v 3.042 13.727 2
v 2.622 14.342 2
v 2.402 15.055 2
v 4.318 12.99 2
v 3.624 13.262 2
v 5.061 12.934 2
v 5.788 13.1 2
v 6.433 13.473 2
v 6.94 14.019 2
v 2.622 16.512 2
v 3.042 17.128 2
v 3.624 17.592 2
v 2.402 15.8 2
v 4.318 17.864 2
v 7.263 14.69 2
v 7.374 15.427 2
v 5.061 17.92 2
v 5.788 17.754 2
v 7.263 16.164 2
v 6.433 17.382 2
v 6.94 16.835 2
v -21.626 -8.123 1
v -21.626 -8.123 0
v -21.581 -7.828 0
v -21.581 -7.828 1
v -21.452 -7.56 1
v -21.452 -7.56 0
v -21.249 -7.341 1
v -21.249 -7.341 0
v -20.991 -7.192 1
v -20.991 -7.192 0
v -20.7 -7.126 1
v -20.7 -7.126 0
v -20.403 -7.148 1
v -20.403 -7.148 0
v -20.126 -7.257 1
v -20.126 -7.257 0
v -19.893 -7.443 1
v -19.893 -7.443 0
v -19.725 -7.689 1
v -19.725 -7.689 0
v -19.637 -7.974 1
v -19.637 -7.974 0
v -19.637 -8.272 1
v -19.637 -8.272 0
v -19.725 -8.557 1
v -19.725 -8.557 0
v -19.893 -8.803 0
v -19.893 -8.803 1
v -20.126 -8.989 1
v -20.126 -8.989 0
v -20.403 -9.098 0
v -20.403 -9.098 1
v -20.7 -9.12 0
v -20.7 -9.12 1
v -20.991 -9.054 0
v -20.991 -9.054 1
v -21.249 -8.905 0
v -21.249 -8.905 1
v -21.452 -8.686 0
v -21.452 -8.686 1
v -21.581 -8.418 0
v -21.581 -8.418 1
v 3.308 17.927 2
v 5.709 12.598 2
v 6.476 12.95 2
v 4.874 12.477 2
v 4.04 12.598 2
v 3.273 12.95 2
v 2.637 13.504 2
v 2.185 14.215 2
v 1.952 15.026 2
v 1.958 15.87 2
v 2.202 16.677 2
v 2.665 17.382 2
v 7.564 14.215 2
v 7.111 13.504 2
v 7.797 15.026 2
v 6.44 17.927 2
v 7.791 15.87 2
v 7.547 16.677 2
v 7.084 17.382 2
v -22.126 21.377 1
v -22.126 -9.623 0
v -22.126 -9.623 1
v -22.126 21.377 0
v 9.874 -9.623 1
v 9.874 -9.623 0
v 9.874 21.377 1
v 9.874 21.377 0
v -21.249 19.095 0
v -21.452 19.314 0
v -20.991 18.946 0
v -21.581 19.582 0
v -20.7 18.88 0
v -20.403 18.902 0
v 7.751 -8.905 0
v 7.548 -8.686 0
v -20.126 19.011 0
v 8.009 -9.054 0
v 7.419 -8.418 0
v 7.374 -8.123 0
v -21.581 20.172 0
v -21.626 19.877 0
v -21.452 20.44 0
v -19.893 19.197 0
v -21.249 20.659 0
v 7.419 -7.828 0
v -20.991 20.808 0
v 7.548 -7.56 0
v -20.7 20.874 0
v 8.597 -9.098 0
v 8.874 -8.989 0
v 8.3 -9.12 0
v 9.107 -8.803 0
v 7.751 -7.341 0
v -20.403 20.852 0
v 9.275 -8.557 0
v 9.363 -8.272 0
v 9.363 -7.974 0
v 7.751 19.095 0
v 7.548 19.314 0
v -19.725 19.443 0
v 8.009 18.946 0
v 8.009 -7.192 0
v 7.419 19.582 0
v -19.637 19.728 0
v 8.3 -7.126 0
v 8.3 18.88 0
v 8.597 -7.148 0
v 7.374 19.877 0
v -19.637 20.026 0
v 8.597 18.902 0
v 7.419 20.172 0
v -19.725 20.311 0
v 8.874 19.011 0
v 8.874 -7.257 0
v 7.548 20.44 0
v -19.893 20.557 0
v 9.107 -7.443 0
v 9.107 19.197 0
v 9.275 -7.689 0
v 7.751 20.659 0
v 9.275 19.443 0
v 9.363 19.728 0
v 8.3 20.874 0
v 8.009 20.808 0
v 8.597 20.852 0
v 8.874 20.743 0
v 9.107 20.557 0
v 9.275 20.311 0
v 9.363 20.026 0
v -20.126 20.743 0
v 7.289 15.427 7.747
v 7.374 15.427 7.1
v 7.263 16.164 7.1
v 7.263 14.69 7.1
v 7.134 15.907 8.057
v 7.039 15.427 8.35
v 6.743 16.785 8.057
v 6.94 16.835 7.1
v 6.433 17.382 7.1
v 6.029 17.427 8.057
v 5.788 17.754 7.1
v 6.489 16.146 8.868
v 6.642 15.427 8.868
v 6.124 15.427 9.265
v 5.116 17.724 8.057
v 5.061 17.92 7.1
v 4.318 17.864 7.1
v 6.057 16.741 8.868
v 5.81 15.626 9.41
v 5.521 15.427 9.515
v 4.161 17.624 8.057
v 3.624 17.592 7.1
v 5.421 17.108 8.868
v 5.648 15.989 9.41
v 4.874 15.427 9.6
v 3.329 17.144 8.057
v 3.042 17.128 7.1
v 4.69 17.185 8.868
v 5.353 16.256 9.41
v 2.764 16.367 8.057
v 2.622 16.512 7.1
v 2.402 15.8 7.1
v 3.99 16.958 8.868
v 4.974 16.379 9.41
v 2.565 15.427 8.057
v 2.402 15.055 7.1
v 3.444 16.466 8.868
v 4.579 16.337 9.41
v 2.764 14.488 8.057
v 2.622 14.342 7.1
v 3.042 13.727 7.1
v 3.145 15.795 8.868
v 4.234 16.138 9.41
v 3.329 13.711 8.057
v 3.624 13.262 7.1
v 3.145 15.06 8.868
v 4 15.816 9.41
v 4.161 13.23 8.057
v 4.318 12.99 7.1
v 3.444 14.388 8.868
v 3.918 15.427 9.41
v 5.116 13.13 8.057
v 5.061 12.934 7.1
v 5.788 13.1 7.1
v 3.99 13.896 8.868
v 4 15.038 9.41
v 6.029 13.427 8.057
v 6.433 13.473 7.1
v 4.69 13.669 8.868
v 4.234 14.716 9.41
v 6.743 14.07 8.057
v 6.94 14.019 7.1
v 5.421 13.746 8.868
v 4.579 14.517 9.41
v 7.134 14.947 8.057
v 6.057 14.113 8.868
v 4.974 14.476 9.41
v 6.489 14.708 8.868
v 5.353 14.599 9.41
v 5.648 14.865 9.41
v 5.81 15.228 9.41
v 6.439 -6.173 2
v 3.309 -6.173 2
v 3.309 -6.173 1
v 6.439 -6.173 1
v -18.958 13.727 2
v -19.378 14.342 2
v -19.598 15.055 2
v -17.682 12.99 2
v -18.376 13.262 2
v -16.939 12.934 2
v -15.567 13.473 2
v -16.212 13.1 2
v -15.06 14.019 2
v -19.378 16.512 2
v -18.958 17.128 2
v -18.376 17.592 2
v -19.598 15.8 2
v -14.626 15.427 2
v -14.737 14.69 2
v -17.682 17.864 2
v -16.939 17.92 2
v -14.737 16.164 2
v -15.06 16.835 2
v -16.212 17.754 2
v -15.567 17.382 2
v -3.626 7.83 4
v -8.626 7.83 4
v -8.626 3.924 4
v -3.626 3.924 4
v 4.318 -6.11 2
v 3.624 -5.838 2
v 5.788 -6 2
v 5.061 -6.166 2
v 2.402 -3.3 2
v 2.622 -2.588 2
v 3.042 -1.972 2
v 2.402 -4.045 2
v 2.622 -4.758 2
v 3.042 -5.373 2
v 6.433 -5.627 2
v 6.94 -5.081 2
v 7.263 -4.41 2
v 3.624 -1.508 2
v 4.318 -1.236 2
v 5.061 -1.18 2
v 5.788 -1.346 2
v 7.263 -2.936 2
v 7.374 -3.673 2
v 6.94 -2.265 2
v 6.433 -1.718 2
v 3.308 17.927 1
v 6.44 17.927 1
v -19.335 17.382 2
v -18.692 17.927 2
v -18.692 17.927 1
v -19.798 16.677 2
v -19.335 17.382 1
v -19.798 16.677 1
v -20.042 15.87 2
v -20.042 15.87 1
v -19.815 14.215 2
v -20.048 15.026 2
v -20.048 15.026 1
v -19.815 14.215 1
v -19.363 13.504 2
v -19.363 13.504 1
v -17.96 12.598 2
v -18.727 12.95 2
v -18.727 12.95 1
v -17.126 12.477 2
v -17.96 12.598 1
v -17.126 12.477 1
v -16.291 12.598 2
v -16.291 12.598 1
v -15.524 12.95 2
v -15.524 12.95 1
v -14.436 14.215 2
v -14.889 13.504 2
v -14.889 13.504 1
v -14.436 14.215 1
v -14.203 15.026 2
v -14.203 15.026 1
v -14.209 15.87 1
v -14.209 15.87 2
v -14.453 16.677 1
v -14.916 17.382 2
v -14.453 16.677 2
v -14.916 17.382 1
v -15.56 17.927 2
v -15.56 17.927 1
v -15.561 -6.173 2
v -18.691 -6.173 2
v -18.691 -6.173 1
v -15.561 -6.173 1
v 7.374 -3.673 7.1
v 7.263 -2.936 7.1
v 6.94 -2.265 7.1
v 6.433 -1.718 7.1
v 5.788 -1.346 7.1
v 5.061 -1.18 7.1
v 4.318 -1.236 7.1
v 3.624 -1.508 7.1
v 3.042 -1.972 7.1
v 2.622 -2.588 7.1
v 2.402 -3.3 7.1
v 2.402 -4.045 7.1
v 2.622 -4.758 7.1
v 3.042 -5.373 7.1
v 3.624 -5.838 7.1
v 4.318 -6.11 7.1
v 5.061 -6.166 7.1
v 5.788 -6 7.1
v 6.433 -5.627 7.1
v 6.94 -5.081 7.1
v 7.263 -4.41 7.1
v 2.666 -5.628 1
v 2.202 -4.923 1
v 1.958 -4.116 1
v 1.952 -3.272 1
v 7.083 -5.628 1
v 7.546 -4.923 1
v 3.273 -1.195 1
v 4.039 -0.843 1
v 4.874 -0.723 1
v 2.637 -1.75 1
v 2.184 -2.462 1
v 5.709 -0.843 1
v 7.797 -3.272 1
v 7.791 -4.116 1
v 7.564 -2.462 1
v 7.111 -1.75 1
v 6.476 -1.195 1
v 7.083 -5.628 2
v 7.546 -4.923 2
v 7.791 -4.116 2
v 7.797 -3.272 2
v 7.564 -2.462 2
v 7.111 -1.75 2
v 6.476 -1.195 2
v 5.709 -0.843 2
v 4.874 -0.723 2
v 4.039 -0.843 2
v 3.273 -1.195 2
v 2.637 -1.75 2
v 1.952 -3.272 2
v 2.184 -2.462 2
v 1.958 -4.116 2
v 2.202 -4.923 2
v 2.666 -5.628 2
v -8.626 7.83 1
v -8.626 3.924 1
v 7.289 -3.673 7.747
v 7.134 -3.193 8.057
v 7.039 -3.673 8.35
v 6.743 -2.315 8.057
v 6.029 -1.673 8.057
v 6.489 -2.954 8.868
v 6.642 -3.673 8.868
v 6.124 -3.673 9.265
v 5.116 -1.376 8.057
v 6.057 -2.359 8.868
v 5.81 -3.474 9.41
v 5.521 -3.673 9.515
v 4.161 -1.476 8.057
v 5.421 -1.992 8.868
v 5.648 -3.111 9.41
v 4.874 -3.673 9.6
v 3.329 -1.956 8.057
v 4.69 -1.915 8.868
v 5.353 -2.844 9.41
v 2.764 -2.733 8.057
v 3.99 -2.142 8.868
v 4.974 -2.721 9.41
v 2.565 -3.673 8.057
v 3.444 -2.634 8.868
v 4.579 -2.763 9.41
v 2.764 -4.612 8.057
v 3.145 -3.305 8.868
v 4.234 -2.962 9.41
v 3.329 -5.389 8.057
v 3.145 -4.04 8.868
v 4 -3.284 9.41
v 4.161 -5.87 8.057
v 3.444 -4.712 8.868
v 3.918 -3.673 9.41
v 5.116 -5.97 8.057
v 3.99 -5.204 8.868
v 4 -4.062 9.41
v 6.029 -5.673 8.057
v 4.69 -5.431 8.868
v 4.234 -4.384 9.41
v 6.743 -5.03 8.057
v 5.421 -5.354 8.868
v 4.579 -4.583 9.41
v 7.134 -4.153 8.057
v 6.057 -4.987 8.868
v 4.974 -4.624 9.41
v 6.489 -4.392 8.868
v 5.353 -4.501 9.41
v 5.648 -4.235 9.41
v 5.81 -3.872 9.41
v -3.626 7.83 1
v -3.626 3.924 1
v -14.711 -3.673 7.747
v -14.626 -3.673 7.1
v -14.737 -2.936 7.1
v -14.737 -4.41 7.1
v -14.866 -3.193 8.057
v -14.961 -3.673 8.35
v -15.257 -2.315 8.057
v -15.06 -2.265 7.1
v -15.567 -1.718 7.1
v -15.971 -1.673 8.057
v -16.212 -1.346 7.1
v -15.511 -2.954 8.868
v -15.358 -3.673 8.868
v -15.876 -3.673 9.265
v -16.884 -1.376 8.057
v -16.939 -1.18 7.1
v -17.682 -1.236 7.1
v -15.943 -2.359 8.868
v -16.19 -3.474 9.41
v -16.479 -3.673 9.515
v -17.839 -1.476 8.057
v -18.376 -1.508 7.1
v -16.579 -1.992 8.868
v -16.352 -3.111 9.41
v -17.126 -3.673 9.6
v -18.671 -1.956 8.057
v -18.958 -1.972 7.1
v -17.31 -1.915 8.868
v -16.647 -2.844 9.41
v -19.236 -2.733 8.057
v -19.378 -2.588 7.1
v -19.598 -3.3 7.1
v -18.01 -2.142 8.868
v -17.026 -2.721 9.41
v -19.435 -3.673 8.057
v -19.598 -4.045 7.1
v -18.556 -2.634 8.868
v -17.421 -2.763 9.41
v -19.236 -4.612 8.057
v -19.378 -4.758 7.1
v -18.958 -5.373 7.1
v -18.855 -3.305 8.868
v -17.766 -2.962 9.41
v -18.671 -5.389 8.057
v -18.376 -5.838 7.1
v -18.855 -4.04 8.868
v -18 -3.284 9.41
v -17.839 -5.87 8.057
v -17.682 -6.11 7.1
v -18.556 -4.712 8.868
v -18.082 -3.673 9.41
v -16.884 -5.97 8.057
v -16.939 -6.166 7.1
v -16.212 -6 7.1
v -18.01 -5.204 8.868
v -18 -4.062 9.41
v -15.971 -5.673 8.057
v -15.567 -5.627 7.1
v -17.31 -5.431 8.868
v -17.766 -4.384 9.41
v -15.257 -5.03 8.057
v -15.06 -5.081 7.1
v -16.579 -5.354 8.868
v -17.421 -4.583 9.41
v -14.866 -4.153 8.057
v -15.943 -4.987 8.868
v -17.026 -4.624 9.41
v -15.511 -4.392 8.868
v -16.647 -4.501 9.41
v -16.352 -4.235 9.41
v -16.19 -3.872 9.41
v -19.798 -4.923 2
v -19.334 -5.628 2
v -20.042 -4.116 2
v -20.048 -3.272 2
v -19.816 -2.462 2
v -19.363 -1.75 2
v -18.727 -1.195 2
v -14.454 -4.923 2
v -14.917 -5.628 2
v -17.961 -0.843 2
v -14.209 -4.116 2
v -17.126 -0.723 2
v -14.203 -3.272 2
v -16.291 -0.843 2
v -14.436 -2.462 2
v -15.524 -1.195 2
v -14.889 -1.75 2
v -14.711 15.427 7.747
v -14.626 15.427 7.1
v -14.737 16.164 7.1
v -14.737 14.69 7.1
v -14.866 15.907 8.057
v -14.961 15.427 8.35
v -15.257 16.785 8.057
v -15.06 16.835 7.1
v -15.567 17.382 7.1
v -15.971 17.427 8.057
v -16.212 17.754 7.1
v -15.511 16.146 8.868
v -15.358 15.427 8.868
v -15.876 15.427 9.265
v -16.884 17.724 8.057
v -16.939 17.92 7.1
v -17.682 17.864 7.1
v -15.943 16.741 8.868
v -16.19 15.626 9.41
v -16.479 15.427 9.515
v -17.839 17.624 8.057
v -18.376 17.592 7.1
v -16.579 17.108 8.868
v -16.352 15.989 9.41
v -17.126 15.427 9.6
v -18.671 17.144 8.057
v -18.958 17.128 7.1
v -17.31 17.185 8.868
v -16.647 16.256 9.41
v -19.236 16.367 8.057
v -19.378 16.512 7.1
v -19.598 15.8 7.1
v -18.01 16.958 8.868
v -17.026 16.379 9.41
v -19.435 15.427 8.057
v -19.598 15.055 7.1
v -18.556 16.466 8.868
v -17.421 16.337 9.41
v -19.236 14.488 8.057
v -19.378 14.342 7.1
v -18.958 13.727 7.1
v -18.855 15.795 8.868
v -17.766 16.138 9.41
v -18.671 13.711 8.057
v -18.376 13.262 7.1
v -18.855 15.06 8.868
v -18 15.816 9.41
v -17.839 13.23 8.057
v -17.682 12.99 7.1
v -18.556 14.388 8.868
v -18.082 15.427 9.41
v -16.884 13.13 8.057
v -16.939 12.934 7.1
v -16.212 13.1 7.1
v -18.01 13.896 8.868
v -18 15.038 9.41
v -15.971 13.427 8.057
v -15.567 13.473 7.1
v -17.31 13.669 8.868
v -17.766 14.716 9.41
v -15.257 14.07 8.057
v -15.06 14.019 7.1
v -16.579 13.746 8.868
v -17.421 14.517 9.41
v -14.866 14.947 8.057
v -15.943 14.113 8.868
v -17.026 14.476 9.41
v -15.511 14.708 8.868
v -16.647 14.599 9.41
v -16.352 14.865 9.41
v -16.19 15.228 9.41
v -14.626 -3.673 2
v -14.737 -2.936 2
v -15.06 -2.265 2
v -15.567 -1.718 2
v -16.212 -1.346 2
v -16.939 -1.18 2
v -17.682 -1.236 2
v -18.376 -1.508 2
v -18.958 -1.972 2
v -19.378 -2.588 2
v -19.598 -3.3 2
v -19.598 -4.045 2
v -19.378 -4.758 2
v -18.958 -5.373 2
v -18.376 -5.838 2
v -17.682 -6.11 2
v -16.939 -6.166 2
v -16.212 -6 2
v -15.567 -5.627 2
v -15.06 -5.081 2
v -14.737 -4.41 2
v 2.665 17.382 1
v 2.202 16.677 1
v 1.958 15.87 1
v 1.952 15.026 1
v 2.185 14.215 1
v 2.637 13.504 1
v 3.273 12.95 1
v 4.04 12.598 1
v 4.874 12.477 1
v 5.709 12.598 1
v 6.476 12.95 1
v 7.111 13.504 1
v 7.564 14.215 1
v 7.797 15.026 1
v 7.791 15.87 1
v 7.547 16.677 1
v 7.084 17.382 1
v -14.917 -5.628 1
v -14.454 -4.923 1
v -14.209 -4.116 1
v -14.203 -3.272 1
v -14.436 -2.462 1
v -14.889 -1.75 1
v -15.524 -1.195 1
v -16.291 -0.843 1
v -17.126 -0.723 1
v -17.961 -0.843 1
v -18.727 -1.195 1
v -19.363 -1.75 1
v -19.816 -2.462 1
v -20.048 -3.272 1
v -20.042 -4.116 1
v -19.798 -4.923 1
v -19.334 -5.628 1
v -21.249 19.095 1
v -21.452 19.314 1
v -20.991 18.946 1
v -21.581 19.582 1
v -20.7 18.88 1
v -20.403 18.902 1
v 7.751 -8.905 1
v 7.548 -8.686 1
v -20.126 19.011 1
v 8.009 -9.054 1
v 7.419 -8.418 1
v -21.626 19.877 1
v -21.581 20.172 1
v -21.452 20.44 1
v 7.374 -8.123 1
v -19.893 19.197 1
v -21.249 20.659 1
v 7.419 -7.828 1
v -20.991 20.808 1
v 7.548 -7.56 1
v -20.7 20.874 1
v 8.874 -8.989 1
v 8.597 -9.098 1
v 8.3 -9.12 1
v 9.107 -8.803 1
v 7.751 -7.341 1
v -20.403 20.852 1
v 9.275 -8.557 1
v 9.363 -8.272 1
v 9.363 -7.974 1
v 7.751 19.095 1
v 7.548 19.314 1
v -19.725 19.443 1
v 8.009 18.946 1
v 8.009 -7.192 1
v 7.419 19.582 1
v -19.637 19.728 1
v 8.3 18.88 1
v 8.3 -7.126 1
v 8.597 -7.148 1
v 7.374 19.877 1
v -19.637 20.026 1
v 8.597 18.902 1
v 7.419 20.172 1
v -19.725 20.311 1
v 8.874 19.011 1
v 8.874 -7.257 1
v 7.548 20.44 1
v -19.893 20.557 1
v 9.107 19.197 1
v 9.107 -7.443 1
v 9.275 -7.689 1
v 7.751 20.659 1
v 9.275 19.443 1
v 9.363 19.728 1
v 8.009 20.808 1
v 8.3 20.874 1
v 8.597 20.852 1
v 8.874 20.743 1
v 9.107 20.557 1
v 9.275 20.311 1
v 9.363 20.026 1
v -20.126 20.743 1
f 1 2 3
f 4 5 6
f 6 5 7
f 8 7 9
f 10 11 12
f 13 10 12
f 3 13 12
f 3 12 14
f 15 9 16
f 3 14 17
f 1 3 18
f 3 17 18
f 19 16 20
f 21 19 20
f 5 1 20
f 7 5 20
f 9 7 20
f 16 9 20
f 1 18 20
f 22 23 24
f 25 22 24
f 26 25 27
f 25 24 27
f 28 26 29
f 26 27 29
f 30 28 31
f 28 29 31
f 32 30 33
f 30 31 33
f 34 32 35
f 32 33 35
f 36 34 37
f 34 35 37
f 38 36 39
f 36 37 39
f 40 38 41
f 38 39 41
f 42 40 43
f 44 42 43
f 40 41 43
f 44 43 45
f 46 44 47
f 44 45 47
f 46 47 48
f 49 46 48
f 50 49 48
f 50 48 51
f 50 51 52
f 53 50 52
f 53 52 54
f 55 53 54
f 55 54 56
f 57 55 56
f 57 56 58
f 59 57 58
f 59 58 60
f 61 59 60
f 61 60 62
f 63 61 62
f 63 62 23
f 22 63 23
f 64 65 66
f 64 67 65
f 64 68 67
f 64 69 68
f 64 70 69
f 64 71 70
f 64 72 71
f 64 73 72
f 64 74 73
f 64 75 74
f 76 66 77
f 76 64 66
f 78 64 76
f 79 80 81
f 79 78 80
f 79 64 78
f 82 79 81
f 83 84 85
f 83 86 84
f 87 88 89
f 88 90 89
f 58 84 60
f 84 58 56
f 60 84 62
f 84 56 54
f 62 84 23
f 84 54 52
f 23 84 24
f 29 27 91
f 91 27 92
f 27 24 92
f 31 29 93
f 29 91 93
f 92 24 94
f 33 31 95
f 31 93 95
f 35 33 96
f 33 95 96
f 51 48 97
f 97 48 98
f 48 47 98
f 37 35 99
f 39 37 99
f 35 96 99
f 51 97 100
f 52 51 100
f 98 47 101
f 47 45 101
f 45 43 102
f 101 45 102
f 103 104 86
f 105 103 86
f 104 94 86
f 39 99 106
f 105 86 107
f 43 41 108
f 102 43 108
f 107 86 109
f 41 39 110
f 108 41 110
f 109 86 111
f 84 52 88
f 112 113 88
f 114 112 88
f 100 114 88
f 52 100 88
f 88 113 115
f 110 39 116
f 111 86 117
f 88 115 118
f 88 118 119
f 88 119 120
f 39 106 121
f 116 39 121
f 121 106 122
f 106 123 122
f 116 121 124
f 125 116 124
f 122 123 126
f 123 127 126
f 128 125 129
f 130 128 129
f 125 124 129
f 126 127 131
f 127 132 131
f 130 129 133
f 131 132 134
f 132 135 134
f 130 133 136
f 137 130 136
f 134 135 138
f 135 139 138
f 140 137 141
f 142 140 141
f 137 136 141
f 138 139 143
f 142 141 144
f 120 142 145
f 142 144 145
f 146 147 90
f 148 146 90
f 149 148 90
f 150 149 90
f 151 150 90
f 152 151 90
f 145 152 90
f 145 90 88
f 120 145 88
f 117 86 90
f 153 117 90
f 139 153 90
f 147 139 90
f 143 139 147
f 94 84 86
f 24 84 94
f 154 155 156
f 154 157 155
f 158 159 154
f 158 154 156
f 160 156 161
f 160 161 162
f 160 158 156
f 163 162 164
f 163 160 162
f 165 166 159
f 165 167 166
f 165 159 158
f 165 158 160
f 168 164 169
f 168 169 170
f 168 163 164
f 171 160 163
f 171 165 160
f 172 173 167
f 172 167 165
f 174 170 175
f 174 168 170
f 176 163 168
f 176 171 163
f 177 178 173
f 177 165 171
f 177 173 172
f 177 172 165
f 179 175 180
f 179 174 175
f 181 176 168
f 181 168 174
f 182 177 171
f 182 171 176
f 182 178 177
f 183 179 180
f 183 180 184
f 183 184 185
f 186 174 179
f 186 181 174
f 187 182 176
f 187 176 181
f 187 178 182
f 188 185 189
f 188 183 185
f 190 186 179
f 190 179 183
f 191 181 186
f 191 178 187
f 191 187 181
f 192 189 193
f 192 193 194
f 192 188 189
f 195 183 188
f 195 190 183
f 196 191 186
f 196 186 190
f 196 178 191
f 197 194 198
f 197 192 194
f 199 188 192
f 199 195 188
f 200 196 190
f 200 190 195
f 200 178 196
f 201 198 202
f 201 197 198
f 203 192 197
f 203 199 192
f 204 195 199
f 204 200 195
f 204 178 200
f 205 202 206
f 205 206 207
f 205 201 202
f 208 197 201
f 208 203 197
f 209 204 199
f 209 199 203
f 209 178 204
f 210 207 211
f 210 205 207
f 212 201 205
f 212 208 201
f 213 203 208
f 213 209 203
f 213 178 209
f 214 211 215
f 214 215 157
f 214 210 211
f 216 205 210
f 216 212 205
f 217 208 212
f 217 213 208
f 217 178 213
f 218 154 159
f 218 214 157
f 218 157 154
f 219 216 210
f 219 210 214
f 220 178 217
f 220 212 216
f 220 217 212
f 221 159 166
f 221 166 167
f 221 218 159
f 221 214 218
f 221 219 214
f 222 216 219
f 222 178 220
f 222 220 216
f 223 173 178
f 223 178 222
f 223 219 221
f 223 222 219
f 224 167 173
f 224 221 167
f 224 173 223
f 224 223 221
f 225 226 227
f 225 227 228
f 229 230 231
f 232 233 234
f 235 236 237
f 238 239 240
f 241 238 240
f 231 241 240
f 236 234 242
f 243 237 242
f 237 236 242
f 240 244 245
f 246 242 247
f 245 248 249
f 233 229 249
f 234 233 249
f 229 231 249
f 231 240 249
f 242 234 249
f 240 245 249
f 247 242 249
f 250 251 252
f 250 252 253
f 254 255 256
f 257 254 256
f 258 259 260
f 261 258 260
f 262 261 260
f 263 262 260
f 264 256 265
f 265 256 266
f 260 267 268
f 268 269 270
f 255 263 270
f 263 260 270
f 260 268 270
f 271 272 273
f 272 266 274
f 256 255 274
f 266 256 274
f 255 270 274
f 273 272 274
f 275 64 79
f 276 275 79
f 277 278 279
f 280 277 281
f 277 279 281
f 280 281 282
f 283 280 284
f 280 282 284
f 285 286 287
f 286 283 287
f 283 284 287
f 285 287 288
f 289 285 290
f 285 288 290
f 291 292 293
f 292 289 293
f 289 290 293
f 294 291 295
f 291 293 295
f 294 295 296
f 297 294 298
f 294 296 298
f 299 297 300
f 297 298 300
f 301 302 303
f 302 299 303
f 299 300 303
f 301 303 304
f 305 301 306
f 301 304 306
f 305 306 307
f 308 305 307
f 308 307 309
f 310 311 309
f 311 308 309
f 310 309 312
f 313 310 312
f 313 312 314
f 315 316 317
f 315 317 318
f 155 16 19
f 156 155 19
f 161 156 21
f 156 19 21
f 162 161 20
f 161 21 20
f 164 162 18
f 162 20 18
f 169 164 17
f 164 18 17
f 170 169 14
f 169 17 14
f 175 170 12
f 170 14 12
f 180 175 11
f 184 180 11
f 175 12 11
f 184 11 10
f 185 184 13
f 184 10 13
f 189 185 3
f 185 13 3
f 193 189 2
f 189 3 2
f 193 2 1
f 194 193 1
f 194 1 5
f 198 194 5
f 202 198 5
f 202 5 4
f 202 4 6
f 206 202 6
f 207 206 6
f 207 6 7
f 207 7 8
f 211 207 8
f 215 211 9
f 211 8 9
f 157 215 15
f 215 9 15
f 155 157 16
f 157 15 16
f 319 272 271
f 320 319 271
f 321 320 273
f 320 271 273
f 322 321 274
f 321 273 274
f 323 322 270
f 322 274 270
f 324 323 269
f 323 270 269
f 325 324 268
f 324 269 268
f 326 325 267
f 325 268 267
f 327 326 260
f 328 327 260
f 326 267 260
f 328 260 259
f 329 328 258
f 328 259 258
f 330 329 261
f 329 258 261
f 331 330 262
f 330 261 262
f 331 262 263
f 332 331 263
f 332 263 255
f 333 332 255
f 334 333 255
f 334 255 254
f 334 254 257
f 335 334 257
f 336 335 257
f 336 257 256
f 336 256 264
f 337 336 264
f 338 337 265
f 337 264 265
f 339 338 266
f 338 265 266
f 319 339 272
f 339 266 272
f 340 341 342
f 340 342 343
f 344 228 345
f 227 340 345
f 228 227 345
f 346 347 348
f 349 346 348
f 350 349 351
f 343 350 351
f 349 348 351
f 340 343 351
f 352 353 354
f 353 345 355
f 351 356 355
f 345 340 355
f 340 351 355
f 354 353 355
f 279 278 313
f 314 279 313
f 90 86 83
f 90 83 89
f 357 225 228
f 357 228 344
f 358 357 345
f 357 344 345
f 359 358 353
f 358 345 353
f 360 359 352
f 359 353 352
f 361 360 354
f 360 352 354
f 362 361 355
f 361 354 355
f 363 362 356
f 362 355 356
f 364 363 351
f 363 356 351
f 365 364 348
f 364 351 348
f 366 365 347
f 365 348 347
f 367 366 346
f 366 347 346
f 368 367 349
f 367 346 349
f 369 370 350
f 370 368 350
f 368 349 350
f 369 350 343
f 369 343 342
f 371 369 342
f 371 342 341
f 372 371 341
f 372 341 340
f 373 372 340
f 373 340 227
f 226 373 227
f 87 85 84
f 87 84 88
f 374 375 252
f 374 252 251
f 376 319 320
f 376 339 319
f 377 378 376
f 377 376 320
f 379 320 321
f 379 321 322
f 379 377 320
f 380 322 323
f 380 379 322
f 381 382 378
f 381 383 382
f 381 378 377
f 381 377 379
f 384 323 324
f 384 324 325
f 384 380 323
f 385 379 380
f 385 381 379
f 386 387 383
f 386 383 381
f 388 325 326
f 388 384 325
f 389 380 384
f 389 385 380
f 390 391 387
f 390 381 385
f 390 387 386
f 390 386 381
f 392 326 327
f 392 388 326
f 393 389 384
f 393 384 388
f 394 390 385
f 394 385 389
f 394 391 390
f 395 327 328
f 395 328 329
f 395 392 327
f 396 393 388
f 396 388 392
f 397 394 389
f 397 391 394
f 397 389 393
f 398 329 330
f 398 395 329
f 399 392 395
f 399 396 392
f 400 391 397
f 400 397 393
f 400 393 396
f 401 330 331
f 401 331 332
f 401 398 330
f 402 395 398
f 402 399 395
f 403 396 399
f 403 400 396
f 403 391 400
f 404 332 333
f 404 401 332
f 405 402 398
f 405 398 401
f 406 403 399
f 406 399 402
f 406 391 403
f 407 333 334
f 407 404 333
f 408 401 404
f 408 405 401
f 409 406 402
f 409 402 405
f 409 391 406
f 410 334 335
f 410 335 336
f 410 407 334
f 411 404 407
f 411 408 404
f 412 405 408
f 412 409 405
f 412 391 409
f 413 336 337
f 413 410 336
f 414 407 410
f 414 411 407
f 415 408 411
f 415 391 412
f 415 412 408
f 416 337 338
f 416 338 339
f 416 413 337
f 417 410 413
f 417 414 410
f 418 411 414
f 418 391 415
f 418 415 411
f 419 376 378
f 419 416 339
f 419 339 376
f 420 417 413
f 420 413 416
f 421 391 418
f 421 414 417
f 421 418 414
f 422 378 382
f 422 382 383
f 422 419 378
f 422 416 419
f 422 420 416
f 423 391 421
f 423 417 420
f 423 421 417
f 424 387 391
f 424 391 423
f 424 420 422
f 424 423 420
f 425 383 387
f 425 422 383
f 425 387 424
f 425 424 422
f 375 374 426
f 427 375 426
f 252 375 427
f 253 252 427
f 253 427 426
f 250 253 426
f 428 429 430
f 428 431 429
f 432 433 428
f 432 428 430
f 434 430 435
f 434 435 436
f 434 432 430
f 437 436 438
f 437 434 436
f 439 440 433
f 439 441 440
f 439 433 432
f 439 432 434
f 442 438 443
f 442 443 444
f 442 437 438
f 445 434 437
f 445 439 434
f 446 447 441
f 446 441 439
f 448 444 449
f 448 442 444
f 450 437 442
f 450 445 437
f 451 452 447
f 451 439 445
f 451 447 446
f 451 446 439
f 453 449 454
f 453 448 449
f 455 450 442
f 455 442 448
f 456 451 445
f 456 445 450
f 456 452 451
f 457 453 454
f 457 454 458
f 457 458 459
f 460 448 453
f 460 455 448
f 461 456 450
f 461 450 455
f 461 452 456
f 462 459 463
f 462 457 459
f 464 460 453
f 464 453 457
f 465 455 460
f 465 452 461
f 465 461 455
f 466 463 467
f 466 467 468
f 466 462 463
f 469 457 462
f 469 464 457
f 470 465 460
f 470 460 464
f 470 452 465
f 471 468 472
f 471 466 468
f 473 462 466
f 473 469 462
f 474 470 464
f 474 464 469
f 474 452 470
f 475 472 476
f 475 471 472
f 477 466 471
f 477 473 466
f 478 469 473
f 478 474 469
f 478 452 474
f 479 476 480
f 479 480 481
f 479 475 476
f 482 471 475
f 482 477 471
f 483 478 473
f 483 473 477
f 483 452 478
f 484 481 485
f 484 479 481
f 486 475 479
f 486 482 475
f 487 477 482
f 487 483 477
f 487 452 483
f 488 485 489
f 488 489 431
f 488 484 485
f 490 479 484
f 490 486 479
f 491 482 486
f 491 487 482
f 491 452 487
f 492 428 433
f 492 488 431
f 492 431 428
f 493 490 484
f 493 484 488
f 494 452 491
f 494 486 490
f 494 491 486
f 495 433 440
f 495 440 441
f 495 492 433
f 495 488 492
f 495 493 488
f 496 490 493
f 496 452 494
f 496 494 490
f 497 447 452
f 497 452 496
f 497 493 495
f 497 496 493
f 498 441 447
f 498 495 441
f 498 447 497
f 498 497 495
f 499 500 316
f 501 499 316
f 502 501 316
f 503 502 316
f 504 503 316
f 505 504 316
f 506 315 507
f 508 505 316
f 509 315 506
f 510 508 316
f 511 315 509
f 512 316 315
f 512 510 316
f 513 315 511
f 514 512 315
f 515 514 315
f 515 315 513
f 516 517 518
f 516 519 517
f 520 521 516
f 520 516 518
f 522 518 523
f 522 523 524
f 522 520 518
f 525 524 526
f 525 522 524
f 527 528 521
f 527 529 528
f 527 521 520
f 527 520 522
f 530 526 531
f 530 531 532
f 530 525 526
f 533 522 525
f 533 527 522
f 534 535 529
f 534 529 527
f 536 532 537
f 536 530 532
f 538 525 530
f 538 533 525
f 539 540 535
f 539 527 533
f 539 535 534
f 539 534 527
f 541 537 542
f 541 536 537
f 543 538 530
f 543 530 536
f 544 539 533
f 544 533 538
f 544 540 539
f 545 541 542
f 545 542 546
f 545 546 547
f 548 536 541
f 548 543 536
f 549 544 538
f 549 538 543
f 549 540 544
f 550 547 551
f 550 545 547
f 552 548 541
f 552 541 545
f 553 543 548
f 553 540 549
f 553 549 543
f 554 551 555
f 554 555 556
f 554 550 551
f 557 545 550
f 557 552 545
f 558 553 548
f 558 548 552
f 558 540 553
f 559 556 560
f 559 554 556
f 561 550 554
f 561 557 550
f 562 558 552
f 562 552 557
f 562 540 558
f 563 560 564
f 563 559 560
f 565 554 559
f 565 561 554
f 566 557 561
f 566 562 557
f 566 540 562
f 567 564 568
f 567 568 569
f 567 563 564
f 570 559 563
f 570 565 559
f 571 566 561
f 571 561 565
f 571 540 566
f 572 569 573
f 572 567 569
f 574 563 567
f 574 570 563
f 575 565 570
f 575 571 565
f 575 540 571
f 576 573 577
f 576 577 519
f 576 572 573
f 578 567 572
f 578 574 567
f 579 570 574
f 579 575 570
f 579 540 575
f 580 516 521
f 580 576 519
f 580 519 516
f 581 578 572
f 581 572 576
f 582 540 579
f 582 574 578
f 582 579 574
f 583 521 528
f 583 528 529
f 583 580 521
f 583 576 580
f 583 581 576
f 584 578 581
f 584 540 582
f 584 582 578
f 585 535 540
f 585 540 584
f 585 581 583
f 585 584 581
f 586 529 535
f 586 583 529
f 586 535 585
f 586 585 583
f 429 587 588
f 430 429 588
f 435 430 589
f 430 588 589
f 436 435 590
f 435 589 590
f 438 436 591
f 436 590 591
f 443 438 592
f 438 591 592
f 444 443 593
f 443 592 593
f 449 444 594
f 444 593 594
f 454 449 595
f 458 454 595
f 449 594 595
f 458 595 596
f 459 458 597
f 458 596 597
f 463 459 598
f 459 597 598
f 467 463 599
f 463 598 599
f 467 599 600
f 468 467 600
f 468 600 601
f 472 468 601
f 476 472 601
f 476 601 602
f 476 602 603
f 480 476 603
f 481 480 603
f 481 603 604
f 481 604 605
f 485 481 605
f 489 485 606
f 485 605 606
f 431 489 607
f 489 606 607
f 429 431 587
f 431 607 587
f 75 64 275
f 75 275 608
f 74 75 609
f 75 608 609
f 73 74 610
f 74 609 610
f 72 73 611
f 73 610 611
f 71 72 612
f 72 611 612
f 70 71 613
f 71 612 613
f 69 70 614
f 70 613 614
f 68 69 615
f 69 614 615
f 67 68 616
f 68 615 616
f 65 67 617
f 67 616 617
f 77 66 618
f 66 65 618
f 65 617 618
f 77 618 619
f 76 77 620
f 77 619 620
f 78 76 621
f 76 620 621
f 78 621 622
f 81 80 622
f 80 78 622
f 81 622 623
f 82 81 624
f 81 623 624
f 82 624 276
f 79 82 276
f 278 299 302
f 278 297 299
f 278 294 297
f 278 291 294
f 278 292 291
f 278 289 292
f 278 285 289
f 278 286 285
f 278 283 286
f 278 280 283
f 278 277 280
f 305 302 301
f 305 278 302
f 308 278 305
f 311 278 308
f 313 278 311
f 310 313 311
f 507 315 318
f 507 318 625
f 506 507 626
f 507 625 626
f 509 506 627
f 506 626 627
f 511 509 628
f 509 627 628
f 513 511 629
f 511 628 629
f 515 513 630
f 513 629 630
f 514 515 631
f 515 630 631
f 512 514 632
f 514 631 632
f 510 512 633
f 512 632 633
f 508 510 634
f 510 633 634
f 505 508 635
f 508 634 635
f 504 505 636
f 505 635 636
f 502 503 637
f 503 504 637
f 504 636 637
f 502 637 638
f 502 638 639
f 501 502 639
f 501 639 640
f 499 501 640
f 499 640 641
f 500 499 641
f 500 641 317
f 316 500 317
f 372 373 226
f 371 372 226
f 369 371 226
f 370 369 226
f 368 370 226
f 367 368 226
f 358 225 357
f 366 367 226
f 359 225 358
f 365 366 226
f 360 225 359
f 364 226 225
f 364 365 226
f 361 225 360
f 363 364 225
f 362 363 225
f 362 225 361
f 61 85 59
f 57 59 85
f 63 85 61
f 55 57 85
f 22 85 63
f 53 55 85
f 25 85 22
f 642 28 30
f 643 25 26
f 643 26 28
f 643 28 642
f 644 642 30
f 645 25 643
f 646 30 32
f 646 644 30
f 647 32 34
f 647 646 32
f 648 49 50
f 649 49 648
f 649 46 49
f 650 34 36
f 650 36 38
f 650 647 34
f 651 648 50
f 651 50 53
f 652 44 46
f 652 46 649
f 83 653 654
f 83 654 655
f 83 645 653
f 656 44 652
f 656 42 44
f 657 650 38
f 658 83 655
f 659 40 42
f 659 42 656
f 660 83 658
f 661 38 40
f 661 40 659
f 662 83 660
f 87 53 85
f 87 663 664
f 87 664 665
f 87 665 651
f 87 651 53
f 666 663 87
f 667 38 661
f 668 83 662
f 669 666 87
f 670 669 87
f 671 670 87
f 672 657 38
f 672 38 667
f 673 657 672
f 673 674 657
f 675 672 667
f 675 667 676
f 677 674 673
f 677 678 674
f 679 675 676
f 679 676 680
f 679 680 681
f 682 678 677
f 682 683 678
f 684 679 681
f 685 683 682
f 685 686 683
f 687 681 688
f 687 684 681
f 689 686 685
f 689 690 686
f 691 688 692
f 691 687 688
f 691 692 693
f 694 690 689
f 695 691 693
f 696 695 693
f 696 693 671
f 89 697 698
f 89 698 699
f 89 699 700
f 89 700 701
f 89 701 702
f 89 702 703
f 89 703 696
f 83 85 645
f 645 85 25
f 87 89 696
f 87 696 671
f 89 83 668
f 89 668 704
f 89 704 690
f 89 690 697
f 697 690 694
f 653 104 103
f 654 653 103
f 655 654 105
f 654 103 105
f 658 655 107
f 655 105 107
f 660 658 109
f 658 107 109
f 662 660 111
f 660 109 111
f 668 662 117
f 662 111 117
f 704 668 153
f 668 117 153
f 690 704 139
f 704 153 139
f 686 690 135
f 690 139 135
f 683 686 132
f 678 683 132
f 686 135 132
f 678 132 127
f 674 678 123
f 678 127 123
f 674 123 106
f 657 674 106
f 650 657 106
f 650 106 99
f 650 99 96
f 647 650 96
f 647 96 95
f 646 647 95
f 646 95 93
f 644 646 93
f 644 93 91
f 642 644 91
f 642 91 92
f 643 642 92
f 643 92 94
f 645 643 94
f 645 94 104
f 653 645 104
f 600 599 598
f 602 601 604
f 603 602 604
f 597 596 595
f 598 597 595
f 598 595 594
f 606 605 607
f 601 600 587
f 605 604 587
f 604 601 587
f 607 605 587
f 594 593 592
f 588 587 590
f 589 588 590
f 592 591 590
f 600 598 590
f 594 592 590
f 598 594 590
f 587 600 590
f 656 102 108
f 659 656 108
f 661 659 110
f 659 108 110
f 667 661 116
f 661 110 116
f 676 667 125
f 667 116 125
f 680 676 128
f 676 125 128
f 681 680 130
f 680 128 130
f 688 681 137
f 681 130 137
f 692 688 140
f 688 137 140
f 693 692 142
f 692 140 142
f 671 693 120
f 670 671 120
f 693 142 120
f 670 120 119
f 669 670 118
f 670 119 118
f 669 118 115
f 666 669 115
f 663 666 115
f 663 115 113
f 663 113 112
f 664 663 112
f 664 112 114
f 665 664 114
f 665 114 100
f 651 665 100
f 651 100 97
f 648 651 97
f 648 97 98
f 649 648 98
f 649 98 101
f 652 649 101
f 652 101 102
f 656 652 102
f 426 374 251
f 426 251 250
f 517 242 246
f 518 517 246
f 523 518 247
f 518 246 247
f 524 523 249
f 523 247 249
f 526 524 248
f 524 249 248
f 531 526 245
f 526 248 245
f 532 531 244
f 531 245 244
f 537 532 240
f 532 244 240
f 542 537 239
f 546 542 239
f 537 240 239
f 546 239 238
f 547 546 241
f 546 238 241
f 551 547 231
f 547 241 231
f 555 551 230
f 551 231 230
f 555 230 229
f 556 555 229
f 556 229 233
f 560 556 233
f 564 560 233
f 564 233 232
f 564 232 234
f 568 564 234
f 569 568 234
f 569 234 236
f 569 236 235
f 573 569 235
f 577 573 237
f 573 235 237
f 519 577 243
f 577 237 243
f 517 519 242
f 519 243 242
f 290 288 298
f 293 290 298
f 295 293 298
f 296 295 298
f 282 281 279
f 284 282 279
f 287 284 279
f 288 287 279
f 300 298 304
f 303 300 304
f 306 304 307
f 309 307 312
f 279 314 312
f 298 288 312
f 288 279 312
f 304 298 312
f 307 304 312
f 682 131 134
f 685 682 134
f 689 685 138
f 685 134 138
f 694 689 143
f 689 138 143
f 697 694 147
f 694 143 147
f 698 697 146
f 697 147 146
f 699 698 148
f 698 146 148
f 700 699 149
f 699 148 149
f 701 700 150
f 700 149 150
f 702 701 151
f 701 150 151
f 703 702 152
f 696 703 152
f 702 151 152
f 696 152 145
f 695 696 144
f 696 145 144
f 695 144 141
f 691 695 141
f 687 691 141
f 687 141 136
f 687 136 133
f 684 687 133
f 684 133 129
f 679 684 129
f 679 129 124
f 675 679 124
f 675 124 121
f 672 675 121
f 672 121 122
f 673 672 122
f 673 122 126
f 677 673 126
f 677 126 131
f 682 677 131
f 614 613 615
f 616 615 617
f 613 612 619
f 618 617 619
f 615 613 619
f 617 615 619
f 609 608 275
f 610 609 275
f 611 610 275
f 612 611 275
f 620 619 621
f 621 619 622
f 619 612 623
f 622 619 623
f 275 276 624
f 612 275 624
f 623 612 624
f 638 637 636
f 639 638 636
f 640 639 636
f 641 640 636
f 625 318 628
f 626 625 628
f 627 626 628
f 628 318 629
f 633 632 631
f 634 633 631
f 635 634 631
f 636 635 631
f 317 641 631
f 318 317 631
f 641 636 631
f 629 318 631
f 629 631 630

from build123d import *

# Parameters (mm, degrees)
SKETCH1_W             = 32
SKETCH1_H             = 25
BOSS_EXTRUDE1_DEPTH   = 1
SKETCH2_R             = 2.5
SKETCH2_W             = 5
SKETCH2_H             = 4.545454546
BOSS_EXTRUDE2_DEPTH   = 8.7
SKETCH3_W             = 7.112296494
SKETCH3_H             = 6.624197715
CUT_EXTRUDE1_DEPTH    = 5.7
FILLET3_R             = 0.5
FILLET4_R             = 2.5
FILLET5_R             = 2.5
SKETCH4_R             = 2.5
CUT_EXTRUDE2_DEPTH    = 10
SKETCH5_R             = 2.95
BOSS_EXTRUDE3_DEPTH   = 1
BOSS_EXTRUDE3_2_DEPTH = 1
BOSS_EXTRUDE3_3_DEPTH = 1
BOSS_EXTRUDE3_4_DEPTH = 1
SKETCH8_R             = 2.5
BOSS_EXTRUDE6_DEPTH   = 7.6
CUT_EXTRUDE4_DEPTH    = 1
FILLET6_R             = 2.5
SKETCH13_R            = 2.367564394
BOSS_EXTRUDE7_DEPTH   = 7.6
SKETCH13_R_2          = 2.5
BOSS_EXTRUDE7_2_DEPTH = 7.6
BOSS_EXTRUDE7_3_DEPTH = 7.6
FILLET7_R             = 2.5
FILLET10_R            = 2.5
SKETCH14_R            = 2.367564394
CUT_EXTRUDE6_DEPTH    = 7.6
SKETCH15_R            = 2.5
BOSS_EXTRUDE9_DEPTH   = 7.6
FILLET12_R            = 2.5
SKETCH16_W            = 25.26079324
SKETCH16_H            = 1.326651886
CUT_EXTRUDE7_DEPTH    = 1
SKETCH17_W            = 30.705826602
SKETCH17_H            = 1.654596323
CUT_EXTRUDE8_DEPTH    = 1
SKETCH21_W            = 5
SKETCH21_H            = 4.545454546
CUT_EXTRUDE10_DEPTH   = 3
SKETCH22_W            = 5
SKETCH22_H            = 3.90625
BOSS_EXTRUDE11_DEPTH  = 3
SKETCH24_W            = 32
SKETCH24_H            = 1
BOSS_EXTRUDE16_DEPTH  = 3
SKETCH26_W            = 32
SKETCH26_H            = 1
BOSS_EXTRUDE17_DEPTH  = 3
SKETCH27_R            = 1
CUT_EXTRUDE11_DEPTH   = 3


with BuildPart() as part:
    # Sketch1 → Boss-Extrude1 (new body)
    with BuildSketch(Plane.XY):
        with Locations((-6.125714286, 5.877142857)):
            Rectangle(SKETCH1_W, SKETCH1_H)
    extrude(amount=BOSS_EXTRUDE1_DEPTH)

    # Sketch2 → Boss-Extrude2 (add)
    with BuildSketch(Plane.XY.offset(1)):
        with Locations((-17.125714286, 15.877142857)):
            Circle(SKETCH2_R)
        with Locations((4.874285714, 15.877142857)):
            Circle(SKETCH2_R)
        with Locations((-17.125714286, -4.122857143)):
            Circle(SKETCH2_R)
        with Locations((4.874285714, -4.122857143)):
            Circle(SKETCH2_R)
        with Locations((-6.125714286, 5.877142857)):
            Rectangle(SKETCH2_W, SKETCH2_H)
    extrude(amount=BOSS_EXTRUDE2_DEPTH)

    # Sketch3 → Cut-Extrude1 (cut)
    with BuildSketch(Plane.XY.offset(9.7)):
        with Locations((-6.125714286, 5.859710758)):
            Rectangle(SKETCH3_W, SKETCH3_H)
    extrude(amount=-CUT_EXTRUDE1_DEPTH, mode=Mode.SUBTRACT)

    # Fillet3
    fillet3_edges = [part.edges().sort_by_distance(p)[0] for p in [
        (-6.125714286, 3.604415584, 4),
        (-3.625714286, 5.877142857, 4),
        (-6.125714286, 8.14987013, 4),
        (-8.625714286, 5.877142857, 4),
    ]]
    fillet(fillet3_edges, radius=FILLET3_R)

    # Fillet4
    fillet4_edges = [part.edges().sort_by_distance(p)[0] for p in [
        (2.374285714, 15.877142857, 9.7),
    ]]
    fillet(fillet4_edges, radius=FILLET4_R)

    # Fillet5
    fillet5_edges = [part.edges().sort_by_distance(p)[0] for p in [
        (-19.625714286, 15.877142857, 9.7),
        (-19.625714286, -4.122857143, 9.7),
        (2.374285714, -4.122857143, 9.7),
    ]]
    fillet(fillet5_edges, radius=FILLET5_R)

    # Sketch4 → Cut-Extrude2 (cut)
    with BuildSketch(Plane.XY.offset(1)):
        with Locations((-17.125714286, -4.122857143)):
            Circle(SKETCH4_R)
        with Locations((-17.125714286, 15.877142857)):
            Circle(SKETCH4_R)
        with Locations((4.874285714, 15.877142857)):
            Circle(SKETCH4_R)
        with Locations((4.874285714, -4.122857143)):
            Circle(SKETCH4_R)
    extrude(amount=CUT_EXTRUDE2_DEPTH, mode=Mode.SUBTRACT)

    # Sketch21 → Cut-Extrude10 (cut)
    with BuildSketch(Plane.XY.offset(4)):
        with Locations((-6.125714286, 5.877142857)):
            Rectangle(SKETCH21_W, SKETCH21_H)
    extrude(amount=-CUT_EXTRUDE10_DEPTH, mode=Mode.SUBTRACT)

    # Sketch24 → Boss-Extrude16 (add)
    with BuildSketch(Plane(origin=(0, 18.377142857, 0), x_dir=(1, 0, 0), z_dir=(0, 1, 0))):
        with Locations((-6.125714286, -0.5)):
            Rectangle(SKETCH24_W, SKETCH24_H)
    extrude(amount=BOSS_EXTRUDE16_DEPTH)

    # Sketch26 → Boss-Extrude17 (add)
    with BuildSketch(Plane.XZ.offset(6.622857143)):
        with Locations((-6.125714286, 0.5)):
            Rectangle(SKETCH26_W, SKETCH26_H)
    extrude(amount=BOSS_EXTRUDE17_DEPTH)

    # Sketch27 → Cut-Extrude11 (cut)
    with BuildSketch(Plane(origin=(0, 0, 0), x_dir=(-1, 0, 0), z_dir=(0, 0, -1))):
        with Locations((-8.374285714, 19.877142857)):
            Circle(SKETCH27_R)
        with Locations((-8.374285714, -8.122857143)):
            Circle(SKETCH27_R)
        with Locations((20.625714286, -8.122857143)):
            Circle(SKETCH27_R)
        with Locations((20.625714286, 19.877142857)):
            Circle(SKETCH27_R)
    extrude(amount=-CUT_EXTRUDE11_DEPTH, mode=Mode.SUBTRACT)


with BuildPart() as body_2:
    # Sketch5 → Boss-Extrude3 (new body)
    with BuildSketch(Plane.XY.offset(1)):
        with Locations((-17.125714286, 15.427142857)):
            Circle(SKETCH5_R)
    extrude(amount=BOSS_EXTRUDE3_DEPTH)

    # Sketch9 → Cut-Extrude4 (cut)
    with BuildSketch(Plane.XY.offset(2)):
        Polygon((-17.125714286, 17.927142857), (-15.287192107, 17.927142857), (-15.485453781, 18.648454573), (-19.121317055, 18.622872422), (-19.121317055, 17.927142857), align=None)
    extrude(amount=-CUT_EXTRUDE4_DEPTH, mode=Mode.SUBTRACT)


with BuildPart() as body_3:
    # Sketch5 → Boss-Extrude3 2 (new body)
    with BuildSketch(Plane.XY.offset(1)):
        with Locations((-17.125714286, -3.672857143)):
            Circle(SKETCH5_R)
    extrude(amount=BOSS_EXTRUDE3_2_DEPTH)


with BuildPart() as body_4:
    # Sketch5 → Boss-Extrude3 3 (new body)
    with BuildSketch(Plane.XY.offset(1)):
        with Locations((4.874285714, 15.427142857)):
            Circle(SKETCH5_R)
    extrude(amount=BOSS_EXTRUDE3_3_DEPTH)

    # Sketch16 → Cut-Extrude7 (cut)
    with BuildSketch(Plane.XY.offset(2)):
        with Locations((-2.929271689, 18.5904688)):
            Rectangle(SKETCH16_W, SKETCH16_H)
    extrude(amount=-CUT_EXTRUDE7_DEPTH, mode=Mode.SUBTRACT)


with BuildPart() as body_5:
    # Sketch5 → Boss-Extrude3 4 (new body)
    with BuildSketch(Plane.XY.offset(1)):
        with Locations((4.874285714, -3.672857143)):
            Circle(SKETCH5_R)
    extrude(amount=BOSS_EXTRUDE3_4_DEPTH)


with BuildPart() as body_6:
    # Sketch8 → Boss-Extrude6 (new body)
    with BuildSketch(Plane.XY.offset(2)):
        with Locations((-17.125714286, 15.427142857)):
            Circle(SKETCH8_R)
    extrude(amount=BOSS_EXTRUDE6_DEPTH)

    # Fillet6
    fillet6_edges = [body_6.edges().sort_by_distance(p)[0] for p in [
        (-19.625714286, 15.427142857, 9.6),
    ]]
    fillet(fillet6_edges, radius=FILLET6_R)


with BuildPart() as body_7:
    # Sketch13 → Boss-Extrude7 (new body)
    with BuildSketch(Plane.XY.offset(2)):
        with Locations((4.874285714, 15.427142857)):
            Circle(SKETCH13_R)
    extrude(amount=BOSS_EXTRUDE7_DEPTH)

    # Sketch14 → Cut-Extrude6 (cut)
    with BuildSketch(Plane.XY.offset(9.6)):
        with Locations((4.874285714, 15.427142857)):
            Circle(SKETCH14_R)
    extrude(amount=-CUT_EXTRUDE6_DEPTH, mode=Mode.SUBTRACT)


with BuildPart() as body_8:
    # Sketch13 → Boss-Extrude7 2 (new body)
    with BuildSketch(Plane.XY.offset(2)):
        with Locations((-17.125714286, -3.672857143)):
            Circle(SKETCH13_R_2)
    extrude(amount=BOSS_EXTRUDE7_2_DEPTH)

    # Fillet7
    fillet7_edges = [body_8.edges().sort_by_distance(p)[0] for p in [
        (-19.625714286, -3.672857143, 9.6),
    ]]
    fillet(fillet7_edges, radius=FILLET7_R)


with BuildPart() as body_9:
    # Sketch13 → Boss-Extrude7 3 (new body)
    with BuildSketch(Plane.XY.offset(2)):
        with Locations((4.874285714, -3.672857143)):
            Circle(SKETCH13_R_2)
    extrude(amount=BOSS_EXTRUDE7_3_DEPTH)

    # Fillet10
    fillet10_edges = [body_9.edges().sort_by_distance(p)[0] for p in [
        (2.374285714, -3.672857143, 9.6),
    ]]
    fillet(fillet10_edges, radius=FILLET10_R)


with BuildPart() as body_9_2:
    # Sketch15 → Boss-Extrude9 (new body)
    with BuildSketch(Plane.XY.offset(2)):
        with Locations((4.874285714, 15.427142857)):
            Circle(SKETCH15_R)
    extrude(amount=BOSS_EXTRUDE9_DEPTH)

    # Fillet12
    fillet12_edges = [body_9_2.edges().sort_by_distance(p)[0] for p in [
        (2.374285714, 15.427142857, 9.6),
    ]]
    fillet(fillet12_edges, radius=FILLET12_R)


with BuildPart() as cut_extrude8_tool:
    # Sketch17 → Cut-Extrude8 (new body)
    with BuildSketch(Plane.XY.offset(2)):
        with Locations((-6.180226628, -7.000761591)):
            Rectangle(SKETCH17_W, SKETCH17_H)
    extrude(amount=-CUT_EXTRUDE8_DEPTH)


with BuildPart() as body_3_1:
    add(body_3.part)

    # Cut-Extrude8: cut by cut_extrude8_tool
    add(cut_extrude8_tool.part, mode=Mode.SUBTRACT)


with BuildPart() as body_5_1:
    add(body_5.part)

    # Cut-Extrude8: cut by cut_extrude8_tool
    add(cut_extrude8_tool.part, mode=Mode.SUBTRACT)


with BuildPart() as body_10:
    # Sketch22 → Boss-Extrude11 (new body)
    with BuildSketch(Plane.XY.offset(1)):
        with Locations((-6.125714286, 5.877142857)):
            Rectangle(SKETCH22_W, SKETCH22_H)
    extrude(amount=BOSS_EXTRUDE11_DEPTH)


solid = Compound([part.part, body_2.part, body_4.part, body_6.part, body_8.part, body_9.part, body_9_2.part, body_3_1.part, body_5_1.part, body_10.part])
